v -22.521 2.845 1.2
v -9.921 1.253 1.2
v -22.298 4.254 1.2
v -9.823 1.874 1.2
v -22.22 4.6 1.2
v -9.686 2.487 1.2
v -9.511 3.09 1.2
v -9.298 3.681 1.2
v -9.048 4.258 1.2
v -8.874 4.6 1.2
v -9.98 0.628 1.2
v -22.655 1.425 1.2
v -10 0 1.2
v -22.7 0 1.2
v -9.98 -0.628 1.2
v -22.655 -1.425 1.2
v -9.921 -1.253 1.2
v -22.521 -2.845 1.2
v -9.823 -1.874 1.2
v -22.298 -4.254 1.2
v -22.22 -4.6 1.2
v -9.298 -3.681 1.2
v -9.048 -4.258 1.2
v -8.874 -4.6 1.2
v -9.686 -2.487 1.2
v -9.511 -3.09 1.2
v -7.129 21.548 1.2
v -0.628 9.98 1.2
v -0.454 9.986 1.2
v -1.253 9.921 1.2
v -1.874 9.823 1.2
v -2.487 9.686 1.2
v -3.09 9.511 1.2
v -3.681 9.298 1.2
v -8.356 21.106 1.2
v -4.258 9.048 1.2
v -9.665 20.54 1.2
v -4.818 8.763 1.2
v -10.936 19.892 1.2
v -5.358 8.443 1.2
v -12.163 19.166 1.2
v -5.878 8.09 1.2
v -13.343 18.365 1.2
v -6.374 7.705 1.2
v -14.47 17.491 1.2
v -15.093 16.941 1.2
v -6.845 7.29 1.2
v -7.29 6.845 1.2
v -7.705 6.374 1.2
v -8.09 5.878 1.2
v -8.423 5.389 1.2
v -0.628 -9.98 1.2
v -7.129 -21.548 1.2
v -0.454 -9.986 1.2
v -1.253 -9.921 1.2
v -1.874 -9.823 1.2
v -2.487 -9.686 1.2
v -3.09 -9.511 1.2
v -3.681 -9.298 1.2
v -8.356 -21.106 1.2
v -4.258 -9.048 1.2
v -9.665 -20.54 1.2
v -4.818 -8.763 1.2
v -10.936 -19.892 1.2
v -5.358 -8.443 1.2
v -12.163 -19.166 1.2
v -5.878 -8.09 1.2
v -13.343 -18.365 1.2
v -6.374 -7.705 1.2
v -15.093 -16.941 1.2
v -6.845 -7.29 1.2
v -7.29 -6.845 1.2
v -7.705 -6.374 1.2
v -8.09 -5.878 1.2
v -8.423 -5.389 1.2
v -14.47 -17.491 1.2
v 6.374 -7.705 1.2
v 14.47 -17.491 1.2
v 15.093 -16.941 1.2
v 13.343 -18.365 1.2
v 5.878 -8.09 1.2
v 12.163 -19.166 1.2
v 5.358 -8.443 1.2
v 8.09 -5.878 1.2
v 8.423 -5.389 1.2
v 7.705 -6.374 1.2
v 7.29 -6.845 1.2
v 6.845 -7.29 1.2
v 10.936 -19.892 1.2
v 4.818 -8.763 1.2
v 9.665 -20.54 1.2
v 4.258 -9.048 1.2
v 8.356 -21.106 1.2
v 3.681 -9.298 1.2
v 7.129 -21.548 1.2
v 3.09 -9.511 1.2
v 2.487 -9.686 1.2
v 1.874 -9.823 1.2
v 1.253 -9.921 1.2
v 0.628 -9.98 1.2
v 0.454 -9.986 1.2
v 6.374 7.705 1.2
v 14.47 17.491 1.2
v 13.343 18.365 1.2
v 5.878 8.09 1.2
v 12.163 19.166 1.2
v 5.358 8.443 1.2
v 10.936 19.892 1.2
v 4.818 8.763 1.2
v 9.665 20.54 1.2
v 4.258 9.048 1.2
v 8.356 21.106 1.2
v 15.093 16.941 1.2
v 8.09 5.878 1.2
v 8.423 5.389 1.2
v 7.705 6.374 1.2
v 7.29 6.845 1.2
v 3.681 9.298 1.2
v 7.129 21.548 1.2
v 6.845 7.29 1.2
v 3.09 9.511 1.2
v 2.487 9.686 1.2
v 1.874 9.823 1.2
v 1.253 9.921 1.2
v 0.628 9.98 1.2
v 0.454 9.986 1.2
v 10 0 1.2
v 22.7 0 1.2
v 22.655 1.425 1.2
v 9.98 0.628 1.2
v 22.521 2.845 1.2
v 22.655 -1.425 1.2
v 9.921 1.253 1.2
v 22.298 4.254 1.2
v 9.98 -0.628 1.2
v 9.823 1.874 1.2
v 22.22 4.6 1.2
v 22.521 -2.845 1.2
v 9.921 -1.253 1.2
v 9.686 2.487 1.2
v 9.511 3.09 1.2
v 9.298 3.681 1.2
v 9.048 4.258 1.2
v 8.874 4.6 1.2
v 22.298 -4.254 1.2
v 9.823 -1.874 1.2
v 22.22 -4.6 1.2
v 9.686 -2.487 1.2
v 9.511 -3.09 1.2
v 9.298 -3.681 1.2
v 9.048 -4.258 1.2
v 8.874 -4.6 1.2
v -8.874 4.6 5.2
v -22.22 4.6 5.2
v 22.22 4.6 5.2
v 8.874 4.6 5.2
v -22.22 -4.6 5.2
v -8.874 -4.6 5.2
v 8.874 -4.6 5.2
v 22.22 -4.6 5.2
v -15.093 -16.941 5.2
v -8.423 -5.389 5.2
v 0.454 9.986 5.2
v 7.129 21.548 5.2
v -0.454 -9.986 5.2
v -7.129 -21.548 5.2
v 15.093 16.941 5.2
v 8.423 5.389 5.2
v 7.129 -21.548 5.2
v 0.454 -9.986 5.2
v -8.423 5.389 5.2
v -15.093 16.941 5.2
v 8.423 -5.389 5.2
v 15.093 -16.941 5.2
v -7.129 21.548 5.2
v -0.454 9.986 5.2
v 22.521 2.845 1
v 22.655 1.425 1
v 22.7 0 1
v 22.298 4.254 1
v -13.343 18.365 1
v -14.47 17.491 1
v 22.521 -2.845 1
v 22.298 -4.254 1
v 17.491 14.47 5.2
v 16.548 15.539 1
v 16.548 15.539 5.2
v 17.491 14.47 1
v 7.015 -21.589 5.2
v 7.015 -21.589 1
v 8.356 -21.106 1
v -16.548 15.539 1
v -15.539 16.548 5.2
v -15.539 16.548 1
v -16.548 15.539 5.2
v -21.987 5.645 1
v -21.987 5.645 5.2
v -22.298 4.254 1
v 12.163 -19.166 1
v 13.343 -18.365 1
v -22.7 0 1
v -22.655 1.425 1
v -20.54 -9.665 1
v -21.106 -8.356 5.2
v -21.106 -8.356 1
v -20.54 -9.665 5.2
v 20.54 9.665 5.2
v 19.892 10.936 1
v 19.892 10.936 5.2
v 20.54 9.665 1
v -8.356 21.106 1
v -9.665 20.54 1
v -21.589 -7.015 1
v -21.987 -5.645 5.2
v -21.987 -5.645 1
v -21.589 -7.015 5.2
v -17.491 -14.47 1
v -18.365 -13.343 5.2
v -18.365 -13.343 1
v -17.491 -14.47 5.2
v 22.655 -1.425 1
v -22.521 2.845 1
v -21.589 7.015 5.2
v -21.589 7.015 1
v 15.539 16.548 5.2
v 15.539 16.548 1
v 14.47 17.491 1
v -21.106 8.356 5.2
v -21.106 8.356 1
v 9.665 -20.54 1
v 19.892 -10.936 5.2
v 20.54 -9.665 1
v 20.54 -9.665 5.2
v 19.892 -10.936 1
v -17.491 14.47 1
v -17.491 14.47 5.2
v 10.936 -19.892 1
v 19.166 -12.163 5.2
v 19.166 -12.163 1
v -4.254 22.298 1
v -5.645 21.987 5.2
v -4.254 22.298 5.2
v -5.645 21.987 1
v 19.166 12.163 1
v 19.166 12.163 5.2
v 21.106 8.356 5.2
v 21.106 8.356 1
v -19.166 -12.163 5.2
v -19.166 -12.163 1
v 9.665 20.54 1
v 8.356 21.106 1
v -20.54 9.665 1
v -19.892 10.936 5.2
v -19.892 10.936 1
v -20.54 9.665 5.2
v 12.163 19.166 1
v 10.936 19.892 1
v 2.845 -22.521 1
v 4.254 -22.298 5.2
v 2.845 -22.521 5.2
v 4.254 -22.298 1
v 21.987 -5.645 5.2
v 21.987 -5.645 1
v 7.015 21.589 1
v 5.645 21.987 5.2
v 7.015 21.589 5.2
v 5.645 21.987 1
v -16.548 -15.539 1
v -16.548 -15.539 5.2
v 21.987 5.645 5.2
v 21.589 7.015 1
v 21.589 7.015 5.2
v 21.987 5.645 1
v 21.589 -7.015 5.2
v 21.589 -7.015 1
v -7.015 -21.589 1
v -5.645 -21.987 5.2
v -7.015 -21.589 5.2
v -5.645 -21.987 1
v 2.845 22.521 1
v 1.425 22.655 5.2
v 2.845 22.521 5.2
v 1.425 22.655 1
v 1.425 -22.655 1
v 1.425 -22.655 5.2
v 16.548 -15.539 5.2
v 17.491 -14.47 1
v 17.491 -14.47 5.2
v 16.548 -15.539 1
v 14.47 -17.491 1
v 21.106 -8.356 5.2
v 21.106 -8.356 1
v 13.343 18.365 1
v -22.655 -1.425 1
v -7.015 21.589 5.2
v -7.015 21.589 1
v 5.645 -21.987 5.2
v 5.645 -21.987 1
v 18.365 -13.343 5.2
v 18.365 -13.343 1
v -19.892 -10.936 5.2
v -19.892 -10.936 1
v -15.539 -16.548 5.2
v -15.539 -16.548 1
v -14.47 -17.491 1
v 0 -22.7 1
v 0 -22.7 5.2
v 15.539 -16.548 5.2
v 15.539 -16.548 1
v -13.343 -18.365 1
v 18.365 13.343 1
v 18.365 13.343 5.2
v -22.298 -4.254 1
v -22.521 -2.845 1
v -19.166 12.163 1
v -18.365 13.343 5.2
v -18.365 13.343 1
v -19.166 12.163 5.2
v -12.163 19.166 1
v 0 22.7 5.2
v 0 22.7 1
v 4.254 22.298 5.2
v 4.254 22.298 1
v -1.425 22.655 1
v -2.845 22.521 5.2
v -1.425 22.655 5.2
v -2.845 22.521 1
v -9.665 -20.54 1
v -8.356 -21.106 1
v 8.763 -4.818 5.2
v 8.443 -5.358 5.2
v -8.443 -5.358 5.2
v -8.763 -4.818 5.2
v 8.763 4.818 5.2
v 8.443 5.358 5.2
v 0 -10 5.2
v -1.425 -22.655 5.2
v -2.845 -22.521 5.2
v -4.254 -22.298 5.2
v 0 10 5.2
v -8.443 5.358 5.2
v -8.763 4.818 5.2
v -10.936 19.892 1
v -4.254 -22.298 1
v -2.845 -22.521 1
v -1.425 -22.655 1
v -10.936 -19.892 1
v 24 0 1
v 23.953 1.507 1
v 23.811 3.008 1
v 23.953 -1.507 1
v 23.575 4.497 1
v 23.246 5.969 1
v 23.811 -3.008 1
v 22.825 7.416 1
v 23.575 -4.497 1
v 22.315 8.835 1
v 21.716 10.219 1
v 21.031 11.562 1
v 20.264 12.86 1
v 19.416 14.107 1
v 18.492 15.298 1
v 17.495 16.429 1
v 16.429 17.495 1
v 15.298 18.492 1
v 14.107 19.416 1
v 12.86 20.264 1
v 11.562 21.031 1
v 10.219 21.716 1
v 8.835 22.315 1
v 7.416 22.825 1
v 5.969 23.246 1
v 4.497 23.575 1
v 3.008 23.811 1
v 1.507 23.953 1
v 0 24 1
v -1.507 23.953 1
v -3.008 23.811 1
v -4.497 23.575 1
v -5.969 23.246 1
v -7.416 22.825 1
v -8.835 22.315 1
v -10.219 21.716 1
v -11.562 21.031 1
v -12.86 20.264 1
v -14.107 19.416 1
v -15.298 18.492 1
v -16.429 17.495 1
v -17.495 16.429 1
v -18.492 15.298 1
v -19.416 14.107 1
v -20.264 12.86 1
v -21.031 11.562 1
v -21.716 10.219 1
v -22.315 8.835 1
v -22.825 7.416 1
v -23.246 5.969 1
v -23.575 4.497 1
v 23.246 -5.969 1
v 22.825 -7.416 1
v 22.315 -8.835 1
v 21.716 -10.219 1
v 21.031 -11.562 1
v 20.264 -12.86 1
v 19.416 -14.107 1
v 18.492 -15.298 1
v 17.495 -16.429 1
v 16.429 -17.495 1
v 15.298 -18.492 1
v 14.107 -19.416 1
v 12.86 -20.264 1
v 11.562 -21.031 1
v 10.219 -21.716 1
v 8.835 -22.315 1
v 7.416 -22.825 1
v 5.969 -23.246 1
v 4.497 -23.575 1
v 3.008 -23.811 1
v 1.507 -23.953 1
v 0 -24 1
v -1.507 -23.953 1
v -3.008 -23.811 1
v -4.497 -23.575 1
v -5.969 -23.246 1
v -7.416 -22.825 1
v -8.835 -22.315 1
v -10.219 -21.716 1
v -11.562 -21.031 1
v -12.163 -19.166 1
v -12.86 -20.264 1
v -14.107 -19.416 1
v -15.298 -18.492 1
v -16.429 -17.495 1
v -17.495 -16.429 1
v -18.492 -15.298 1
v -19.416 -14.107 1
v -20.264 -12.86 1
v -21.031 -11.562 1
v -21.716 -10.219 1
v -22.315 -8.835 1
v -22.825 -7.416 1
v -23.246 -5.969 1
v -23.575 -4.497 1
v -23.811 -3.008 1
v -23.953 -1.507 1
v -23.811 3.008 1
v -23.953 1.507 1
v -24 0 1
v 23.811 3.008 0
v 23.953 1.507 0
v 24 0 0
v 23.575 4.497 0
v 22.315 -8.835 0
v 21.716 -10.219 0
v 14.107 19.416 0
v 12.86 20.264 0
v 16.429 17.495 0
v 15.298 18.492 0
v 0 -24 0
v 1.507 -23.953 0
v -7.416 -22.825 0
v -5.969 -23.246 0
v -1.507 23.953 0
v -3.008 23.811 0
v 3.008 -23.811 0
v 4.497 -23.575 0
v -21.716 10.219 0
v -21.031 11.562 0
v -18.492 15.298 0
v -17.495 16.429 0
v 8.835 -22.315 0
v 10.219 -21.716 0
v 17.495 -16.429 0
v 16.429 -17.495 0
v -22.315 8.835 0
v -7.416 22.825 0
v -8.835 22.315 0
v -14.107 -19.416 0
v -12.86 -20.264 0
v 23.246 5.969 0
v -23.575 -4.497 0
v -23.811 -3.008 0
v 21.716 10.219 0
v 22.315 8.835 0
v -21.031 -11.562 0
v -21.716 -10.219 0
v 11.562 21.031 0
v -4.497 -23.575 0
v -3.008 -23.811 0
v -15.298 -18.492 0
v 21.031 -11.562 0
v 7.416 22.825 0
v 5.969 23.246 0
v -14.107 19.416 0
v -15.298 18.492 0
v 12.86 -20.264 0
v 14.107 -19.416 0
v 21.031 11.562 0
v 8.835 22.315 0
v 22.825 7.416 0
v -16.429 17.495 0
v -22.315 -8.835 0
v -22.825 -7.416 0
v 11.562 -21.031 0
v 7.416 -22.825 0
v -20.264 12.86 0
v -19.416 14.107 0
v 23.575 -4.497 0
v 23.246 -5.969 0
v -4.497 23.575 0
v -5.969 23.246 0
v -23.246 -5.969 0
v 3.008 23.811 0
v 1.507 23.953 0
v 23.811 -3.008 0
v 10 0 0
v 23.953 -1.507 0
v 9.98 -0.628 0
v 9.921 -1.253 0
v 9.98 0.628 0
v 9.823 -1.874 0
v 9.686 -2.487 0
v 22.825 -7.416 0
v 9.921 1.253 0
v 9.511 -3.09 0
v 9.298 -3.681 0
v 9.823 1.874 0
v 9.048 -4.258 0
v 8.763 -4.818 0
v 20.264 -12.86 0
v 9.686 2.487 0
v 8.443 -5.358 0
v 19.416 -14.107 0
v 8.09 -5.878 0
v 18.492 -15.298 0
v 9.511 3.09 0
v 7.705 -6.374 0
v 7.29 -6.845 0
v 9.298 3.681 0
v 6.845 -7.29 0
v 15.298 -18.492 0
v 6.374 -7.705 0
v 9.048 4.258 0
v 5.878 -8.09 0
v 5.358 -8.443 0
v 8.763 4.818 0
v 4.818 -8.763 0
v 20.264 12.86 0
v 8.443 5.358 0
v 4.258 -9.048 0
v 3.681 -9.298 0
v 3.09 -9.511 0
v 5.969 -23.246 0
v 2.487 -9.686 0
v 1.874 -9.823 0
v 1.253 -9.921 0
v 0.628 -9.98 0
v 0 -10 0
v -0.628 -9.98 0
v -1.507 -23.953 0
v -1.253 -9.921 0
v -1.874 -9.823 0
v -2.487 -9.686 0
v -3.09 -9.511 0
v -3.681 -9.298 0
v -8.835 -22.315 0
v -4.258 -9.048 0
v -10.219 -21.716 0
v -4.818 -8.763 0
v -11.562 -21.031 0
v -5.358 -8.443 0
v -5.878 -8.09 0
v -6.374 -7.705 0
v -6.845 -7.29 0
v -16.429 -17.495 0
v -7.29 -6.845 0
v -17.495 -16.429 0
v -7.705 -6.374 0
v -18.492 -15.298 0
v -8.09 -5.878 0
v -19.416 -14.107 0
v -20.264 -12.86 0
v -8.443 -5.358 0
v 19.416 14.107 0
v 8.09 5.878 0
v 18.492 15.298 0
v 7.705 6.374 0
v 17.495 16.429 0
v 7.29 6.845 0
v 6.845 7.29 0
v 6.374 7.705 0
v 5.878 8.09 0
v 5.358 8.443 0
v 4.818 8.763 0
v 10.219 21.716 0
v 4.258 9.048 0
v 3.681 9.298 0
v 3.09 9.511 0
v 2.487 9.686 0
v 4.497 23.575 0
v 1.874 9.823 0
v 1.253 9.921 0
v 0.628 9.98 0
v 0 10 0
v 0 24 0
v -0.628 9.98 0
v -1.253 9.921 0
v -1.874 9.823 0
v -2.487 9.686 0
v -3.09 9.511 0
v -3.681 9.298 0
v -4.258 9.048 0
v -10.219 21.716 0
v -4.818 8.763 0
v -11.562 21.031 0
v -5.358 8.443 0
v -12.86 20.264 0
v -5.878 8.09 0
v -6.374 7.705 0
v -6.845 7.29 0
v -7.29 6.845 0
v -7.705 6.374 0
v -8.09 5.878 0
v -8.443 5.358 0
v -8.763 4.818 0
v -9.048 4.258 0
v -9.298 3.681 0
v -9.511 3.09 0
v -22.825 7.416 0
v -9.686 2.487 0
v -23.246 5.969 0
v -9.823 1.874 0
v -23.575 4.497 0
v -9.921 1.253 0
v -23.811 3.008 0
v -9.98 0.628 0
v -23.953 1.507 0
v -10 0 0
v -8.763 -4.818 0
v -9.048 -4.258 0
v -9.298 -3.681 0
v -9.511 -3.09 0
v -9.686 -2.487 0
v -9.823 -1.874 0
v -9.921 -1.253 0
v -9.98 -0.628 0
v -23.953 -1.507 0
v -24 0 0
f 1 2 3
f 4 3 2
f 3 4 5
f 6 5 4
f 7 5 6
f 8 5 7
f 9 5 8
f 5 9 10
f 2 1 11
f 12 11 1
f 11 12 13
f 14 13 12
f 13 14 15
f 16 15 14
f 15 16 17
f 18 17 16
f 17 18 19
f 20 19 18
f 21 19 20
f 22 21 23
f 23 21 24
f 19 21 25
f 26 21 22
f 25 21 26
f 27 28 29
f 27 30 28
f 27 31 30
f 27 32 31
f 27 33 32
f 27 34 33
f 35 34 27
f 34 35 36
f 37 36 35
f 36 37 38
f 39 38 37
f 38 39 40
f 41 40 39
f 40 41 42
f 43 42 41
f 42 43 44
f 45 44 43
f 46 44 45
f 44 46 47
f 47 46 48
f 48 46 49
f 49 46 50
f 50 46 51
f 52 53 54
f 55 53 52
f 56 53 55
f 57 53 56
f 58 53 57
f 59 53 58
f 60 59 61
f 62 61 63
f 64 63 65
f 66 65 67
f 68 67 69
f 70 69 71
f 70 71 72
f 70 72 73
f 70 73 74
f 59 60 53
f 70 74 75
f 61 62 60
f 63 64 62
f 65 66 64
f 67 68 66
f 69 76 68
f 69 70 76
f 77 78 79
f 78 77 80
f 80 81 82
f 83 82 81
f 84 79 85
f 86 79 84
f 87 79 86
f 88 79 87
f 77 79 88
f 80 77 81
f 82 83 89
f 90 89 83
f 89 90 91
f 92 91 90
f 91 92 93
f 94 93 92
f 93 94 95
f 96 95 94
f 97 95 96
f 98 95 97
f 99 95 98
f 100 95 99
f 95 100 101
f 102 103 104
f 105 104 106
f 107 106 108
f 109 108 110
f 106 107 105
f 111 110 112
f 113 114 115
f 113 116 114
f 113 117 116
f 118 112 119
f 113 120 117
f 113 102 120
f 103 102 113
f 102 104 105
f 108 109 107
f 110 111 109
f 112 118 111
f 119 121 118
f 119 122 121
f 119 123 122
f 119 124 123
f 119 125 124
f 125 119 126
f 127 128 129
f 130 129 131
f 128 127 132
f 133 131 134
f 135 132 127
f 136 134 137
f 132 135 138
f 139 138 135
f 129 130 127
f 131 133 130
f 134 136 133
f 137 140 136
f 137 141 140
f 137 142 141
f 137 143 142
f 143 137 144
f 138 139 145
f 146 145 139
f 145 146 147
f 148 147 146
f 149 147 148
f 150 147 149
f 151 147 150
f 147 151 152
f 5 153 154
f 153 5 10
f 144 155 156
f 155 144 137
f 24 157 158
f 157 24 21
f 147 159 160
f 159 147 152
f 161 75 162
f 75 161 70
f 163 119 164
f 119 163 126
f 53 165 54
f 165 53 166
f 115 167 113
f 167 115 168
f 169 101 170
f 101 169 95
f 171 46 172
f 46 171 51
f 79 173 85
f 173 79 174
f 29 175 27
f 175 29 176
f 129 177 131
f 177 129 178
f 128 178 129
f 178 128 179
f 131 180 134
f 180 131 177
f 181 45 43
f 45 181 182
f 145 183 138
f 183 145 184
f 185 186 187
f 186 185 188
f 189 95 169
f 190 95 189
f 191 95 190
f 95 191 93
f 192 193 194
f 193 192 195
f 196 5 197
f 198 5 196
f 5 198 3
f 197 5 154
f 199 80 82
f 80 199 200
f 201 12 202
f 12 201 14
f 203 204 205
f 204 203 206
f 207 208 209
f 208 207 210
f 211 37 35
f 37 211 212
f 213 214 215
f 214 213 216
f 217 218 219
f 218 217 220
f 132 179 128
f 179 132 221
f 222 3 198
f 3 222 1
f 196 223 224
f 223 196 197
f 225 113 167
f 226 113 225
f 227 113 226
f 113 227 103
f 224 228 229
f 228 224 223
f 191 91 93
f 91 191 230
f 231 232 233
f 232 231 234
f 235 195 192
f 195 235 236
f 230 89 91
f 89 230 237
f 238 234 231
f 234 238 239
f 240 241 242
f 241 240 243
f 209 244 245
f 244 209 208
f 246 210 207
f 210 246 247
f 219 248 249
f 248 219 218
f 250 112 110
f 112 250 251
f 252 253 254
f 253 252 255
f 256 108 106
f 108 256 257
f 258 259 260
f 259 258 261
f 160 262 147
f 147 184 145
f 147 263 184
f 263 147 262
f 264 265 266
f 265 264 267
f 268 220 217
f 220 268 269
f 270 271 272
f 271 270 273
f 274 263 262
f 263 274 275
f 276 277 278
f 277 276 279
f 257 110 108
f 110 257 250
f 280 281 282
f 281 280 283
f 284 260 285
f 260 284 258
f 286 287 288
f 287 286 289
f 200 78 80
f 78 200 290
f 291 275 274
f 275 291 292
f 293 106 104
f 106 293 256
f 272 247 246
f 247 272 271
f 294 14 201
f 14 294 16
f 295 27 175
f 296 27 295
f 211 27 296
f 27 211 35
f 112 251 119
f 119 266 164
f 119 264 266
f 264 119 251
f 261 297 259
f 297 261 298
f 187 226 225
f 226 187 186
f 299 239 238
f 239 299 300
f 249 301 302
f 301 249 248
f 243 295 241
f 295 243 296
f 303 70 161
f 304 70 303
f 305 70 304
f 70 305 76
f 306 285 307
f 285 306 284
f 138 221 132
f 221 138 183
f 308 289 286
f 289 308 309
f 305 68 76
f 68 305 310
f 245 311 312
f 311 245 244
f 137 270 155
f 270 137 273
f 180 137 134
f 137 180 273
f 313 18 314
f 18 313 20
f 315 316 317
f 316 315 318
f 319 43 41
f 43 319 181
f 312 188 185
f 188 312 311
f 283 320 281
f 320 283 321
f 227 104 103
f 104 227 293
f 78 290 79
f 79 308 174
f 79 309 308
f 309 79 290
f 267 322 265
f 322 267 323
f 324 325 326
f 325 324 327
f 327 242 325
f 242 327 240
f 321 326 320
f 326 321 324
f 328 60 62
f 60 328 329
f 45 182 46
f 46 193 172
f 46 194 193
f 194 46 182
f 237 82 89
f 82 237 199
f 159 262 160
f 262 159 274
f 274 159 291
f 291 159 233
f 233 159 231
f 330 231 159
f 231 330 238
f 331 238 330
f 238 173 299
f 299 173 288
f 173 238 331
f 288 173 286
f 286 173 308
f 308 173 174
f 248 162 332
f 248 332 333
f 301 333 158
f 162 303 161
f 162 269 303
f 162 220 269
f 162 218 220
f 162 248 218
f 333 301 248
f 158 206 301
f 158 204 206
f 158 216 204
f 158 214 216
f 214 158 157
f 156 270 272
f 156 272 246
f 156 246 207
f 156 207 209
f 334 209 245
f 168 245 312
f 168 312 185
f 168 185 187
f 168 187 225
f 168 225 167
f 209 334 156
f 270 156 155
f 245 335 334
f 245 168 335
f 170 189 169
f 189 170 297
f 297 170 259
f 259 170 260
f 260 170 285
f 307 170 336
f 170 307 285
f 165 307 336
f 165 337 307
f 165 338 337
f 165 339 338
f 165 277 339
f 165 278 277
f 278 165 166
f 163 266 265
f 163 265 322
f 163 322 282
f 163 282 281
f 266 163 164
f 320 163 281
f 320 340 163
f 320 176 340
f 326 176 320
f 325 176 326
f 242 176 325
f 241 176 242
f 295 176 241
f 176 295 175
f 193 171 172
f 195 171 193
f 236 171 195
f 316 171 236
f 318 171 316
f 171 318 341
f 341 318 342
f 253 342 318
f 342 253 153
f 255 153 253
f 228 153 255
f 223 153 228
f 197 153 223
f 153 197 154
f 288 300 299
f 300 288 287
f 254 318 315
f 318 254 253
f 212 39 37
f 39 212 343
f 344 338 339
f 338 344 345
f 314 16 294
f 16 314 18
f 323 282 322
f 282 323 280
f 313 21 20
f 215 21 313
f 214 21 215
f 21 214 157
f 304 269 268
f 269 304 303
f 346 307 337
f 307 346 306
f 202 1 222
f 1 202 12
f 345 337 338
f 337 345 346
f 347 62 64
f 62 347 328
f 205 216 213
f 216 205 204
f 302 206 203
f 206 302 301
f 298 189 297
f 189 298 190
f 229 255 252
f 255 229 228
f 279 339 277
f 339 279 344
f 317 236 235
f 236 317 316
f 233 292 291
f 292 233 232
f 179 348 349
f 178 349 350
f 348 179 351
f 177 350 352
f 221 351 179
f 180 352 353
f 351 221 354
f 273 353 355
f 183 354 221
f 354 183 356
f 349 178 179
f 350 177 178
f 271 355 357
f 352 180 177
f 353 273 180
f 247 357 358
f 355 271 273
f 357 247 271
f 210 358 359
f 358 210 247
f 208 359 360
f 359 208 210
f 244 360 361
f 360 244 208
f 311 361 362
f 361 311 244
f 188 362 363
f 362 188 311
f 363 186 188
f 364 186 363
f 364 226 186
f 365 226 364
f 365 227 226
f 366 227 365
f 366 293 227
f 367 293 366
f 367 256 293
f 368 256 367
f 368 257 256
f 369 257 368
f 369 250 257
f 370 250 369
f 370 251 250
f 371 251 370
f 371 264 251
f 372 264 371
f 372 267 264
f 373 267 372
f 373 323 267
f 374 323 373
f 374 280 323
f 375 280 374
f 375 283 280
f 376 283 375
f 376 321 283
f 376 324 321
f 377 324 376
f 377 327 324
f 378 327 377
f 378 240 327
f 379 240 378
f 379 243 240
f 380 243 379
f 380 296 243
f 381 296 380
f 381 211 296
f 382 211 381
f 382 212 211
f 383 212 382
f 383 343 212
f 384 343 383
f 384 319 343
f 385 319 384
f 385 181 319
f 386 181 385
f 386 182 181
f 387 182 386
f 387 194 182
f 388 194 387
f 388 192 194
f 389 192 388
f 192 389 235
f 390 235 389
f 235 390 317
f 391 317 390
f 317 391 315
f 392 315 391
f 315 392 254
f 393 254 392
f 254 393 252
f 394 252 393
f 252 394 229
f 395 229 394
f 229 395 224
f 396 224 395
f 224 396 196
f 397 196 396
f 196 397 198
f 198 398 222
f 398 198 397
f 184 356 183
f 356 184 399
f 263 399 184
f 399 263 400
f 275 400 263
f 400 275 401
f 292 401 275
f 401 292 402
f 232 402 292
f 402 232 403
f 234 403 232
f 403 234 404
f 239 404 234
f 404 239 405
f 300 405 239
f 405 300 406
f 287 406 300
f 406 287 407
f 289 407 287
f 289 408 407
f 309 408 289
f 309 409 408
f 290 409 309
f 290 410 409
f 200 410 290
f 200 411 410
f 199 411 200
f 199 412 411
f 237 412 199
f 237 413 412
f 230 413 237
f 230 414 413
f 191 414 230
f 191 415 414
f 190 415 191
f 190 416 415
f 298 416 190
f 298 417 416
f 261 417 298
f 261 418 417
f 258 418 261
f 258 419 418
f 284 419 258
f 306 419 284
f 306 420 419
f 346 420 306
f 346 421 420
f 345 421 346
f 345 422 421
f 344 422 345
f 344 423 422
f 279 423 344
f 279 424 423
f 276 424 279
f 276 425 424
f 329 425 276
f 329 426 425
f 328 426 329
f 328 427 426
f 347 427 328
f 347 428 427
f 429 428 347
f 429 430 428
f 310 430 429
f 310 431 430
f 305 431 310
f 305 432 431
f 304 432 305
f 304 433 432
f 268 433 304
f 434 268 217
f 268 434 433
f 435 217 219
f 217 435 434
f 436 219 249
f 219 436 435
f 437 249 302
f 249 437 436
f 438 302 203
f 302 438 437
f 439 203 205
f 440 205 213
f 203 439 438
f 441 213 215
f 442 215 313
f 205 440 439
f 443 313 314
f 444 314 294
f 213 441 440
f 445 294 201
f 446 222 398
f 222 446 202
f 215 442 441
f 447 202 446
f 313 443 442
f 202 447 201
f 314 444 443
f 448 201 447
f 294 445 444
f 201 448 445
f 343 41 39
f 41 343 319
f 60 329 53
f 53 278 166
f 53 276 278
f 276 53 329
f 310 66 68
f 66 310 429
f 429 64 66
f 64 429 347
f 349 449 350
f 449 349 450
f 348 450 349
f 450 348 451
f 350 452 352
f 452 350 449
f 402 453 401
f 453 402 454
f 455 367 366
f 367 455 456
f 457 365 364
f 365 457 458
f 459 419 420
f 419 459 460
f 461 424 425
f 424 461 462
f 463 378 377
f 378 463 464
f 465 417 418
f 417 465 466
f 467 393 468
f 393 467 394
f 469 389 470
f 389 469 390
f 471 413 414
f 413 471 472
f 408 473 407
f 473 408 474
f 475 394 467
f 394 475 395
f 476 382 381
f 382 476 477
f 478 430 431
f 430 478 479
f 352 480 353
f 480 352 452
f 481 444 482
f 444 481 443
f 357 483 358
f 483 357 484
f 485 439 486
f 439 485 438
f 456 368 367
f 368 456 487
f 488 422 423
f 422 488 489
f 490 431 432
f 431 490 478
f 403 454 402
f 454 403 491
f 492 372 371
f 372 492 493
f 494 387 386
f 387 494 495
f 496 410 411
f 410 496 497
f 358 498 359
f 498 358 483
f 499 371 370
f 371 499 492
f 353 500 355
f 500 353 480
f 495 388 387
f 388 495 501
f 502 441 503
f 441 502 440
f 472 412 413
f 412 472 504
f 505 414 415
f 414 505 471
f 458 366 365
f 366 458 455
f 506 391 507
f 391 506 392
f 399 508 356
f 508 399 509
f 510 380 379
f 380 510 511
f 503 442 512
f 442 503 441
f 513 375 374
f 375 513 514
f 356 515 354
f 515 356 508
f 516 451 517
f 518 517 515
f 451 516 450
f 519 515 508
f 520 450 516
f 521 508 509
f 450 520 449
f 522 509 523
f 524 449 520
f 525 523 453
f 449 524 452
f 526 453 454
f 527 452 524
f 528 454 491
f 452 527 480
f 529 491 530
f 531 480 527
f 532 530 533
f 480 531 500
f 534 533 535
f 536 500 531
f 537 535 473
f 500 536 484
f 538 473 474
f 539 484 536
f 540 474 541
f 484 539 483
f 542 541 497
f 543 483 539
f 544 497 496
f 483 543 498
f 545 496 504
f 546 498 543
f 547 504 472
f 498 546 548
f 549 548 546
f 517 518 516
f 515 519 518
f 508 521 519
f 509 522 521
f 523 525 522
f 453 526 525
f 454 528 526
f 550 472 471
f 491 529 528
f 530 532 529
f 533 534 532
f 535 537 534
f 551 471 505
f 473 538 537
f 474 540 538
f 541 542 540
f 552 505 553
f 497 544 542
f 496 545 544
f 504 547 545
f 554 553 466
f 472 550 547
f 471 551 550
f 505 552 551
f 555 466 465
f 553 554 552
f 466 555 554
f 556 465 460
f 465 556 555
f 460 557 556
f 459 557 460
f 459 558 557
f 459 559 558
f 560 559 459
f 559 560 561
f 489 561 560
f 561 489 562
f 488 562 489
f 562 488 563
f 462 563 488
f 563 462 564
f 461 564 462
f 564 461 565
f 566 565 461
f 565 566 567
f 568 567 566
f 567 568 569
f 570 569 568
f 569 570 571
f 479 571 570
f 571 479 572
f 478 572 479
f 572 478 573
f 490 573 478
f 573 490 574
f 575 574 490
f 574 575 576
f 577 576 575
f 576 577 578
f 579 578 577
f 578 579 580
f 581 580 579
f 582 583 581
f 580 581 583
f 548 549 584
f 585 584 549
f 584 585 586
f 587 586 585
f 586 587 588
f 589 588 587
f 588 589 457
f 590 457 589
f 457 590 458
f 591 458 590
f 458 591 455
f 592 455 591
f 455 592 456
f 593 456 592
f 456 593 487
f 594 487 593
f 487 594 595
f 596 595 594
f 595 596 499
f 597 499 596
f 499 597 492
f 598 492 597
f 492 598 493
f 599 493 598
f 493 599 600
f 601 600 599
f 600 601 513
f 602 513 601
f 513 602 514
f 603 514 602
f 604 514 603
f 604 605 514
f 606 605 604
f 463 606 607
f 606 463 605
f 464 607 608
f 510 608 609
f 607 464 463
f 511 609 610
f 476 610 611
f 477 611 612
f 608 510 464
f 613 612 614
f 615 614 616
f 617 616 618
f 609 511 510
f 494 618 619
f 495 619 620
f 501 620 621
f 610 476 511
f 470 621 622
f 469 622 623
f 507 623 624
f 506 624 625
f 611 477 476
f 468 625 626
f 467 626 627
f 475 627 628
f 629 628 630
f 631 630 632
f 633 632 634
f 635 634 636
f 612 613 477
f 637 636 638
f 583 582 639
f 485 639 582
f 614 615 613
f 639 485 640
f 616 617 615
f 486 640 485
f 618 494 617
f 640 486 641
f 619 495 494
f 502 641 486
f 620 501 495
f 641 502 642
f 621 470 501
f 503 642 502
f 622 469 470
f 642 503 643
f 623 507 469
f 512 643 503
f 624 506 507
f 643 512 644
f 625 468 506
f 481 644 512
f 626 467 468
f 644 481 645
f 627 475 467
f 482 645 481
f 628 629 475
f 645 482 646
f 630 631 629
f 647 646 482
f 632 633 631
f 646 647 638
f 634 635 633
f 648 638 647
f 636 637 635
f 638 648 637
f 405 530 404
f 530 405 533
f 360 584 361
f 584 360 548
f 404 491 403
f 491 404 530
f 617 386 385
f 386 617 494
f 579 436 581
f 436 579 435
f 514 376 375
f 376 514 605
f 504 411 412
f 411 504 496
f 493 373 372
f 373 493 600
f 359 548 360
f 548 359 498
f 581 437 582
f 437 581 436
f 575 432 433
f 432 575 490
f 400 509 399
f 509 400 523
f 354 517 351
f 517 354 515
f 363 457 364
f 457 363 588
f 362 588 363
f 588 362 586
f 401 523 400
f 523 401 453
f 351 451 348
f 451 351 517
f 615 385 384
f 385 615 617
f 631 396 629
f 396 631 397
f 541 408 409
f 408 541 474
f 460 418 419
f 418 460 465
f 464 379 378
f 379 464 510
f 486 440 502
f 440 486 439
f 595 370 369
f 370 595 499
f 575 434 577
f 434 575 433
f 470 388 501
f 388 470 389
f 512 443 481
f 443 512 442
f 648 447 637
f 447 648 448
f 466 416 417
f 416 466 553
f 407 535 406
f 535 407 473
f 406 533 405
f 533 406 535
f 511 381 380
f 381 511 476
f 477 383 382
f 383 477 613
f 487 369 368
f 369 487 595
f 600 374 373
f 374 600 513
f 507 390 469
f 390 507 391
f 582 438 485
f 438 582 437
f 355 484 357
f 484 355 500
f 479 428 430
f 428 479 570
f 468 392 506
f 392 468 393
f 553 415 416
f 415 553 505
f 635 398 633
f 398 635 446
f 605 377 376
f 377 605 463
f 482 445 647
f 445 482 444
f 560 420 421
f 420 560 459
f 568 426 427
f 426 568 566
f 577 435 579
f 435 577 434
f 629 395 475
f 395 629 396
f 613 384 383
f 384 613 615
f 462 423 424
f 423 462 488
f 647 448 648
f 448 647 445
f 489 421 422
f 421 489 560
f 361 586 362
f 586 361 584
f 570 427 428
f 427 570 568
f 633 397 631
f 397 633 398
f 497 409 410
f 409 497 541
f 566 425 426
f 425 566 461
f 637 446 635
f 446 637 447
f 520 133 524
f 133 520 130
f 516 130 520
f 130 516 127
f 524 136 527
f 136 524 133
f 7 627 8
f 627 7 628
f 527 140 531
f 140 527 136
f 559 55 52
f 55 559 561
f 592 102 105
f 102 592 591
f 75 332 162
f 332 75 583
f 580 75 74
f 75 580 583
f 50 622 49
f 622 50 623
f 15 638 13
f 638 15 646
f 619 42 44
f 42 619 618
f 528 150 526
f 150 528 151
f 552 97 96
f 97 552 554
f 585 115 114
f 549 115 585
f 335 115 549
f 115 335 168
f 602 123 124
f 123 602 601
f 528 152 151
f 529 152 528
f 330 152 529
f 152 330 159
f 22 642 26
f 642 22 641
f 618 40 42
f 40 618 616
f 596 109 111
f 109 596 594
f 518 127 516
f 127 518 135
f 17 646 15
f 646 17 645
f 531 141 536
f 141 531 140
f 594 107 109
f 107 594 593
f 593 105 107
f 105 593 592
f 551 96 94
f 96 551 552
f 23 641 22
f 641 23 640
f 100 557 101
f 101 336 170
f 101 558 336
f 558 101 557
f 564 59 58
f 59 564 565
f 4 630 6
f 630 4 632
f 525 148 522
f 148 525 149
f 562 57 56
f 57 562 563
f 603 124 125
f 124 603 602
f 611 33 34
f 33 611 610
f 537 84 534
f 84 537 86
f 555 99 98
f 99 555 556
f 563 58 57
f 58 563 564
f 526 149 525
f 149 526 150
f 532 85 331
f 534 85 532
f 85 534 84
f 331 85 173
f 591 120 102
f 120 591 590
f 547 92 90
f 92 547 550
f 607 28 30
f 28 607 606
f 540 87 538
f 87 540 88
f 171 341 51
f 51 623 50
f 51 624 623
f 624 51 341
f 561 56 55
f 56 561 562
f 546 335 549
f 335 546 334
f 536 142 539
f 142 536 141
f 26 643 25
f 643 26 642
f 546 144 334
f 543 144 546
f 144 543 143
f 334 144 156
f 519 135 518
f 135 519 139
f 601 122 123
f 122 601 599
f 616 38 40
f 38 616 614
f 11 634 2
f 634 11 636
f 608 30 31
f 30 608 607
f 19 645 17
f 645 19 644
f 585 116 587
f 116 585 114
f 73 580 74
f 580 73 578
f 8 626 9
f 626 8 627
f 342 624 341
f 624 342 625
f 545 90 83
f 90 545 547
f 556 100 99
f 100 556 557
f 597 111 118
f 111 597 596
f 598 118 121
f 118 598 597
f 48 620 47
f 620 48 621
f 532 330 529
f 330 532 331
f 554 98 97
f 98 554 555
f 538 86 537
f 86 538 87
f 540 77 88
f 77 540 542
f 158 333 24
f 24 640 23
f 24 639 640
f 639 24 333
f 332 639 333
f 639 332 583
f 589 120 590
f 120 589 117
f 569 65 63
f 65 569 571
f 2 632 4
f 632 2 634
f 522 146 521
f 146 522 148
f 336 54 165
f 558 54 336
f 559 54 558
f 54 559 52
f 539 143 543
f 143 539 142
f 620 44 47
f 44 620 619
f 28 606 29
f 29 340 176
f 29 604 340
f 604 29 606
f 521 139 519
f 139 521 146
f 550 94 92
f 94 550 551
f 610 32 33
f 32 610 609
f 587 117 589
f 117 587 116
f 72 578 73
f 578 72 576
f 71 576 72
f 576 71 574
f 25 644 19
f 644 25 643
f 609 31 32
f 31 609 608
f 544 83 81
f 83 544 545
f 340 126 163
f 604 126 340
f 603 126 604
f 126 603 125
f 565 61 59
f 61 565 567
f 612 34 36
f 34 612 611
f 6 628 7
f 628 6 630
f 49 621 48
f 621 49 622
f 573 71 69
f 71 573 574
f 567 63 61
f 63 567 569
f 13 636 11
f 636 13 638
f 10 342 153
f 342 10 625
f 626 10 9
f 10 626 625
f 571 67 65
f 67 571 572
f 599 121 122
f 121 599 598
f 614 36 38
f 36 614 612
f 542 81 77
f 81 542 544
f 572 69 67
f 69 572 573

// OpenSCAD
$fn = 100;

difference() {
  union() {
    cylinder(1, 24, 24);

    translate([0, 0, 1]) difference() {
      cylinder(4.2, 22.7, 22.7);
      
      translate([0, 0, 3.2]) {
        cube([50, 9.2, 6], true);
        rotate(60) cube([50, 9.2, 6], true);
        rotate(120) cube([50, 9.2, 6], true);
      }
    }
  }
  
  translate([0, 0, -1]) cylinder(7, 10, 10);
}
